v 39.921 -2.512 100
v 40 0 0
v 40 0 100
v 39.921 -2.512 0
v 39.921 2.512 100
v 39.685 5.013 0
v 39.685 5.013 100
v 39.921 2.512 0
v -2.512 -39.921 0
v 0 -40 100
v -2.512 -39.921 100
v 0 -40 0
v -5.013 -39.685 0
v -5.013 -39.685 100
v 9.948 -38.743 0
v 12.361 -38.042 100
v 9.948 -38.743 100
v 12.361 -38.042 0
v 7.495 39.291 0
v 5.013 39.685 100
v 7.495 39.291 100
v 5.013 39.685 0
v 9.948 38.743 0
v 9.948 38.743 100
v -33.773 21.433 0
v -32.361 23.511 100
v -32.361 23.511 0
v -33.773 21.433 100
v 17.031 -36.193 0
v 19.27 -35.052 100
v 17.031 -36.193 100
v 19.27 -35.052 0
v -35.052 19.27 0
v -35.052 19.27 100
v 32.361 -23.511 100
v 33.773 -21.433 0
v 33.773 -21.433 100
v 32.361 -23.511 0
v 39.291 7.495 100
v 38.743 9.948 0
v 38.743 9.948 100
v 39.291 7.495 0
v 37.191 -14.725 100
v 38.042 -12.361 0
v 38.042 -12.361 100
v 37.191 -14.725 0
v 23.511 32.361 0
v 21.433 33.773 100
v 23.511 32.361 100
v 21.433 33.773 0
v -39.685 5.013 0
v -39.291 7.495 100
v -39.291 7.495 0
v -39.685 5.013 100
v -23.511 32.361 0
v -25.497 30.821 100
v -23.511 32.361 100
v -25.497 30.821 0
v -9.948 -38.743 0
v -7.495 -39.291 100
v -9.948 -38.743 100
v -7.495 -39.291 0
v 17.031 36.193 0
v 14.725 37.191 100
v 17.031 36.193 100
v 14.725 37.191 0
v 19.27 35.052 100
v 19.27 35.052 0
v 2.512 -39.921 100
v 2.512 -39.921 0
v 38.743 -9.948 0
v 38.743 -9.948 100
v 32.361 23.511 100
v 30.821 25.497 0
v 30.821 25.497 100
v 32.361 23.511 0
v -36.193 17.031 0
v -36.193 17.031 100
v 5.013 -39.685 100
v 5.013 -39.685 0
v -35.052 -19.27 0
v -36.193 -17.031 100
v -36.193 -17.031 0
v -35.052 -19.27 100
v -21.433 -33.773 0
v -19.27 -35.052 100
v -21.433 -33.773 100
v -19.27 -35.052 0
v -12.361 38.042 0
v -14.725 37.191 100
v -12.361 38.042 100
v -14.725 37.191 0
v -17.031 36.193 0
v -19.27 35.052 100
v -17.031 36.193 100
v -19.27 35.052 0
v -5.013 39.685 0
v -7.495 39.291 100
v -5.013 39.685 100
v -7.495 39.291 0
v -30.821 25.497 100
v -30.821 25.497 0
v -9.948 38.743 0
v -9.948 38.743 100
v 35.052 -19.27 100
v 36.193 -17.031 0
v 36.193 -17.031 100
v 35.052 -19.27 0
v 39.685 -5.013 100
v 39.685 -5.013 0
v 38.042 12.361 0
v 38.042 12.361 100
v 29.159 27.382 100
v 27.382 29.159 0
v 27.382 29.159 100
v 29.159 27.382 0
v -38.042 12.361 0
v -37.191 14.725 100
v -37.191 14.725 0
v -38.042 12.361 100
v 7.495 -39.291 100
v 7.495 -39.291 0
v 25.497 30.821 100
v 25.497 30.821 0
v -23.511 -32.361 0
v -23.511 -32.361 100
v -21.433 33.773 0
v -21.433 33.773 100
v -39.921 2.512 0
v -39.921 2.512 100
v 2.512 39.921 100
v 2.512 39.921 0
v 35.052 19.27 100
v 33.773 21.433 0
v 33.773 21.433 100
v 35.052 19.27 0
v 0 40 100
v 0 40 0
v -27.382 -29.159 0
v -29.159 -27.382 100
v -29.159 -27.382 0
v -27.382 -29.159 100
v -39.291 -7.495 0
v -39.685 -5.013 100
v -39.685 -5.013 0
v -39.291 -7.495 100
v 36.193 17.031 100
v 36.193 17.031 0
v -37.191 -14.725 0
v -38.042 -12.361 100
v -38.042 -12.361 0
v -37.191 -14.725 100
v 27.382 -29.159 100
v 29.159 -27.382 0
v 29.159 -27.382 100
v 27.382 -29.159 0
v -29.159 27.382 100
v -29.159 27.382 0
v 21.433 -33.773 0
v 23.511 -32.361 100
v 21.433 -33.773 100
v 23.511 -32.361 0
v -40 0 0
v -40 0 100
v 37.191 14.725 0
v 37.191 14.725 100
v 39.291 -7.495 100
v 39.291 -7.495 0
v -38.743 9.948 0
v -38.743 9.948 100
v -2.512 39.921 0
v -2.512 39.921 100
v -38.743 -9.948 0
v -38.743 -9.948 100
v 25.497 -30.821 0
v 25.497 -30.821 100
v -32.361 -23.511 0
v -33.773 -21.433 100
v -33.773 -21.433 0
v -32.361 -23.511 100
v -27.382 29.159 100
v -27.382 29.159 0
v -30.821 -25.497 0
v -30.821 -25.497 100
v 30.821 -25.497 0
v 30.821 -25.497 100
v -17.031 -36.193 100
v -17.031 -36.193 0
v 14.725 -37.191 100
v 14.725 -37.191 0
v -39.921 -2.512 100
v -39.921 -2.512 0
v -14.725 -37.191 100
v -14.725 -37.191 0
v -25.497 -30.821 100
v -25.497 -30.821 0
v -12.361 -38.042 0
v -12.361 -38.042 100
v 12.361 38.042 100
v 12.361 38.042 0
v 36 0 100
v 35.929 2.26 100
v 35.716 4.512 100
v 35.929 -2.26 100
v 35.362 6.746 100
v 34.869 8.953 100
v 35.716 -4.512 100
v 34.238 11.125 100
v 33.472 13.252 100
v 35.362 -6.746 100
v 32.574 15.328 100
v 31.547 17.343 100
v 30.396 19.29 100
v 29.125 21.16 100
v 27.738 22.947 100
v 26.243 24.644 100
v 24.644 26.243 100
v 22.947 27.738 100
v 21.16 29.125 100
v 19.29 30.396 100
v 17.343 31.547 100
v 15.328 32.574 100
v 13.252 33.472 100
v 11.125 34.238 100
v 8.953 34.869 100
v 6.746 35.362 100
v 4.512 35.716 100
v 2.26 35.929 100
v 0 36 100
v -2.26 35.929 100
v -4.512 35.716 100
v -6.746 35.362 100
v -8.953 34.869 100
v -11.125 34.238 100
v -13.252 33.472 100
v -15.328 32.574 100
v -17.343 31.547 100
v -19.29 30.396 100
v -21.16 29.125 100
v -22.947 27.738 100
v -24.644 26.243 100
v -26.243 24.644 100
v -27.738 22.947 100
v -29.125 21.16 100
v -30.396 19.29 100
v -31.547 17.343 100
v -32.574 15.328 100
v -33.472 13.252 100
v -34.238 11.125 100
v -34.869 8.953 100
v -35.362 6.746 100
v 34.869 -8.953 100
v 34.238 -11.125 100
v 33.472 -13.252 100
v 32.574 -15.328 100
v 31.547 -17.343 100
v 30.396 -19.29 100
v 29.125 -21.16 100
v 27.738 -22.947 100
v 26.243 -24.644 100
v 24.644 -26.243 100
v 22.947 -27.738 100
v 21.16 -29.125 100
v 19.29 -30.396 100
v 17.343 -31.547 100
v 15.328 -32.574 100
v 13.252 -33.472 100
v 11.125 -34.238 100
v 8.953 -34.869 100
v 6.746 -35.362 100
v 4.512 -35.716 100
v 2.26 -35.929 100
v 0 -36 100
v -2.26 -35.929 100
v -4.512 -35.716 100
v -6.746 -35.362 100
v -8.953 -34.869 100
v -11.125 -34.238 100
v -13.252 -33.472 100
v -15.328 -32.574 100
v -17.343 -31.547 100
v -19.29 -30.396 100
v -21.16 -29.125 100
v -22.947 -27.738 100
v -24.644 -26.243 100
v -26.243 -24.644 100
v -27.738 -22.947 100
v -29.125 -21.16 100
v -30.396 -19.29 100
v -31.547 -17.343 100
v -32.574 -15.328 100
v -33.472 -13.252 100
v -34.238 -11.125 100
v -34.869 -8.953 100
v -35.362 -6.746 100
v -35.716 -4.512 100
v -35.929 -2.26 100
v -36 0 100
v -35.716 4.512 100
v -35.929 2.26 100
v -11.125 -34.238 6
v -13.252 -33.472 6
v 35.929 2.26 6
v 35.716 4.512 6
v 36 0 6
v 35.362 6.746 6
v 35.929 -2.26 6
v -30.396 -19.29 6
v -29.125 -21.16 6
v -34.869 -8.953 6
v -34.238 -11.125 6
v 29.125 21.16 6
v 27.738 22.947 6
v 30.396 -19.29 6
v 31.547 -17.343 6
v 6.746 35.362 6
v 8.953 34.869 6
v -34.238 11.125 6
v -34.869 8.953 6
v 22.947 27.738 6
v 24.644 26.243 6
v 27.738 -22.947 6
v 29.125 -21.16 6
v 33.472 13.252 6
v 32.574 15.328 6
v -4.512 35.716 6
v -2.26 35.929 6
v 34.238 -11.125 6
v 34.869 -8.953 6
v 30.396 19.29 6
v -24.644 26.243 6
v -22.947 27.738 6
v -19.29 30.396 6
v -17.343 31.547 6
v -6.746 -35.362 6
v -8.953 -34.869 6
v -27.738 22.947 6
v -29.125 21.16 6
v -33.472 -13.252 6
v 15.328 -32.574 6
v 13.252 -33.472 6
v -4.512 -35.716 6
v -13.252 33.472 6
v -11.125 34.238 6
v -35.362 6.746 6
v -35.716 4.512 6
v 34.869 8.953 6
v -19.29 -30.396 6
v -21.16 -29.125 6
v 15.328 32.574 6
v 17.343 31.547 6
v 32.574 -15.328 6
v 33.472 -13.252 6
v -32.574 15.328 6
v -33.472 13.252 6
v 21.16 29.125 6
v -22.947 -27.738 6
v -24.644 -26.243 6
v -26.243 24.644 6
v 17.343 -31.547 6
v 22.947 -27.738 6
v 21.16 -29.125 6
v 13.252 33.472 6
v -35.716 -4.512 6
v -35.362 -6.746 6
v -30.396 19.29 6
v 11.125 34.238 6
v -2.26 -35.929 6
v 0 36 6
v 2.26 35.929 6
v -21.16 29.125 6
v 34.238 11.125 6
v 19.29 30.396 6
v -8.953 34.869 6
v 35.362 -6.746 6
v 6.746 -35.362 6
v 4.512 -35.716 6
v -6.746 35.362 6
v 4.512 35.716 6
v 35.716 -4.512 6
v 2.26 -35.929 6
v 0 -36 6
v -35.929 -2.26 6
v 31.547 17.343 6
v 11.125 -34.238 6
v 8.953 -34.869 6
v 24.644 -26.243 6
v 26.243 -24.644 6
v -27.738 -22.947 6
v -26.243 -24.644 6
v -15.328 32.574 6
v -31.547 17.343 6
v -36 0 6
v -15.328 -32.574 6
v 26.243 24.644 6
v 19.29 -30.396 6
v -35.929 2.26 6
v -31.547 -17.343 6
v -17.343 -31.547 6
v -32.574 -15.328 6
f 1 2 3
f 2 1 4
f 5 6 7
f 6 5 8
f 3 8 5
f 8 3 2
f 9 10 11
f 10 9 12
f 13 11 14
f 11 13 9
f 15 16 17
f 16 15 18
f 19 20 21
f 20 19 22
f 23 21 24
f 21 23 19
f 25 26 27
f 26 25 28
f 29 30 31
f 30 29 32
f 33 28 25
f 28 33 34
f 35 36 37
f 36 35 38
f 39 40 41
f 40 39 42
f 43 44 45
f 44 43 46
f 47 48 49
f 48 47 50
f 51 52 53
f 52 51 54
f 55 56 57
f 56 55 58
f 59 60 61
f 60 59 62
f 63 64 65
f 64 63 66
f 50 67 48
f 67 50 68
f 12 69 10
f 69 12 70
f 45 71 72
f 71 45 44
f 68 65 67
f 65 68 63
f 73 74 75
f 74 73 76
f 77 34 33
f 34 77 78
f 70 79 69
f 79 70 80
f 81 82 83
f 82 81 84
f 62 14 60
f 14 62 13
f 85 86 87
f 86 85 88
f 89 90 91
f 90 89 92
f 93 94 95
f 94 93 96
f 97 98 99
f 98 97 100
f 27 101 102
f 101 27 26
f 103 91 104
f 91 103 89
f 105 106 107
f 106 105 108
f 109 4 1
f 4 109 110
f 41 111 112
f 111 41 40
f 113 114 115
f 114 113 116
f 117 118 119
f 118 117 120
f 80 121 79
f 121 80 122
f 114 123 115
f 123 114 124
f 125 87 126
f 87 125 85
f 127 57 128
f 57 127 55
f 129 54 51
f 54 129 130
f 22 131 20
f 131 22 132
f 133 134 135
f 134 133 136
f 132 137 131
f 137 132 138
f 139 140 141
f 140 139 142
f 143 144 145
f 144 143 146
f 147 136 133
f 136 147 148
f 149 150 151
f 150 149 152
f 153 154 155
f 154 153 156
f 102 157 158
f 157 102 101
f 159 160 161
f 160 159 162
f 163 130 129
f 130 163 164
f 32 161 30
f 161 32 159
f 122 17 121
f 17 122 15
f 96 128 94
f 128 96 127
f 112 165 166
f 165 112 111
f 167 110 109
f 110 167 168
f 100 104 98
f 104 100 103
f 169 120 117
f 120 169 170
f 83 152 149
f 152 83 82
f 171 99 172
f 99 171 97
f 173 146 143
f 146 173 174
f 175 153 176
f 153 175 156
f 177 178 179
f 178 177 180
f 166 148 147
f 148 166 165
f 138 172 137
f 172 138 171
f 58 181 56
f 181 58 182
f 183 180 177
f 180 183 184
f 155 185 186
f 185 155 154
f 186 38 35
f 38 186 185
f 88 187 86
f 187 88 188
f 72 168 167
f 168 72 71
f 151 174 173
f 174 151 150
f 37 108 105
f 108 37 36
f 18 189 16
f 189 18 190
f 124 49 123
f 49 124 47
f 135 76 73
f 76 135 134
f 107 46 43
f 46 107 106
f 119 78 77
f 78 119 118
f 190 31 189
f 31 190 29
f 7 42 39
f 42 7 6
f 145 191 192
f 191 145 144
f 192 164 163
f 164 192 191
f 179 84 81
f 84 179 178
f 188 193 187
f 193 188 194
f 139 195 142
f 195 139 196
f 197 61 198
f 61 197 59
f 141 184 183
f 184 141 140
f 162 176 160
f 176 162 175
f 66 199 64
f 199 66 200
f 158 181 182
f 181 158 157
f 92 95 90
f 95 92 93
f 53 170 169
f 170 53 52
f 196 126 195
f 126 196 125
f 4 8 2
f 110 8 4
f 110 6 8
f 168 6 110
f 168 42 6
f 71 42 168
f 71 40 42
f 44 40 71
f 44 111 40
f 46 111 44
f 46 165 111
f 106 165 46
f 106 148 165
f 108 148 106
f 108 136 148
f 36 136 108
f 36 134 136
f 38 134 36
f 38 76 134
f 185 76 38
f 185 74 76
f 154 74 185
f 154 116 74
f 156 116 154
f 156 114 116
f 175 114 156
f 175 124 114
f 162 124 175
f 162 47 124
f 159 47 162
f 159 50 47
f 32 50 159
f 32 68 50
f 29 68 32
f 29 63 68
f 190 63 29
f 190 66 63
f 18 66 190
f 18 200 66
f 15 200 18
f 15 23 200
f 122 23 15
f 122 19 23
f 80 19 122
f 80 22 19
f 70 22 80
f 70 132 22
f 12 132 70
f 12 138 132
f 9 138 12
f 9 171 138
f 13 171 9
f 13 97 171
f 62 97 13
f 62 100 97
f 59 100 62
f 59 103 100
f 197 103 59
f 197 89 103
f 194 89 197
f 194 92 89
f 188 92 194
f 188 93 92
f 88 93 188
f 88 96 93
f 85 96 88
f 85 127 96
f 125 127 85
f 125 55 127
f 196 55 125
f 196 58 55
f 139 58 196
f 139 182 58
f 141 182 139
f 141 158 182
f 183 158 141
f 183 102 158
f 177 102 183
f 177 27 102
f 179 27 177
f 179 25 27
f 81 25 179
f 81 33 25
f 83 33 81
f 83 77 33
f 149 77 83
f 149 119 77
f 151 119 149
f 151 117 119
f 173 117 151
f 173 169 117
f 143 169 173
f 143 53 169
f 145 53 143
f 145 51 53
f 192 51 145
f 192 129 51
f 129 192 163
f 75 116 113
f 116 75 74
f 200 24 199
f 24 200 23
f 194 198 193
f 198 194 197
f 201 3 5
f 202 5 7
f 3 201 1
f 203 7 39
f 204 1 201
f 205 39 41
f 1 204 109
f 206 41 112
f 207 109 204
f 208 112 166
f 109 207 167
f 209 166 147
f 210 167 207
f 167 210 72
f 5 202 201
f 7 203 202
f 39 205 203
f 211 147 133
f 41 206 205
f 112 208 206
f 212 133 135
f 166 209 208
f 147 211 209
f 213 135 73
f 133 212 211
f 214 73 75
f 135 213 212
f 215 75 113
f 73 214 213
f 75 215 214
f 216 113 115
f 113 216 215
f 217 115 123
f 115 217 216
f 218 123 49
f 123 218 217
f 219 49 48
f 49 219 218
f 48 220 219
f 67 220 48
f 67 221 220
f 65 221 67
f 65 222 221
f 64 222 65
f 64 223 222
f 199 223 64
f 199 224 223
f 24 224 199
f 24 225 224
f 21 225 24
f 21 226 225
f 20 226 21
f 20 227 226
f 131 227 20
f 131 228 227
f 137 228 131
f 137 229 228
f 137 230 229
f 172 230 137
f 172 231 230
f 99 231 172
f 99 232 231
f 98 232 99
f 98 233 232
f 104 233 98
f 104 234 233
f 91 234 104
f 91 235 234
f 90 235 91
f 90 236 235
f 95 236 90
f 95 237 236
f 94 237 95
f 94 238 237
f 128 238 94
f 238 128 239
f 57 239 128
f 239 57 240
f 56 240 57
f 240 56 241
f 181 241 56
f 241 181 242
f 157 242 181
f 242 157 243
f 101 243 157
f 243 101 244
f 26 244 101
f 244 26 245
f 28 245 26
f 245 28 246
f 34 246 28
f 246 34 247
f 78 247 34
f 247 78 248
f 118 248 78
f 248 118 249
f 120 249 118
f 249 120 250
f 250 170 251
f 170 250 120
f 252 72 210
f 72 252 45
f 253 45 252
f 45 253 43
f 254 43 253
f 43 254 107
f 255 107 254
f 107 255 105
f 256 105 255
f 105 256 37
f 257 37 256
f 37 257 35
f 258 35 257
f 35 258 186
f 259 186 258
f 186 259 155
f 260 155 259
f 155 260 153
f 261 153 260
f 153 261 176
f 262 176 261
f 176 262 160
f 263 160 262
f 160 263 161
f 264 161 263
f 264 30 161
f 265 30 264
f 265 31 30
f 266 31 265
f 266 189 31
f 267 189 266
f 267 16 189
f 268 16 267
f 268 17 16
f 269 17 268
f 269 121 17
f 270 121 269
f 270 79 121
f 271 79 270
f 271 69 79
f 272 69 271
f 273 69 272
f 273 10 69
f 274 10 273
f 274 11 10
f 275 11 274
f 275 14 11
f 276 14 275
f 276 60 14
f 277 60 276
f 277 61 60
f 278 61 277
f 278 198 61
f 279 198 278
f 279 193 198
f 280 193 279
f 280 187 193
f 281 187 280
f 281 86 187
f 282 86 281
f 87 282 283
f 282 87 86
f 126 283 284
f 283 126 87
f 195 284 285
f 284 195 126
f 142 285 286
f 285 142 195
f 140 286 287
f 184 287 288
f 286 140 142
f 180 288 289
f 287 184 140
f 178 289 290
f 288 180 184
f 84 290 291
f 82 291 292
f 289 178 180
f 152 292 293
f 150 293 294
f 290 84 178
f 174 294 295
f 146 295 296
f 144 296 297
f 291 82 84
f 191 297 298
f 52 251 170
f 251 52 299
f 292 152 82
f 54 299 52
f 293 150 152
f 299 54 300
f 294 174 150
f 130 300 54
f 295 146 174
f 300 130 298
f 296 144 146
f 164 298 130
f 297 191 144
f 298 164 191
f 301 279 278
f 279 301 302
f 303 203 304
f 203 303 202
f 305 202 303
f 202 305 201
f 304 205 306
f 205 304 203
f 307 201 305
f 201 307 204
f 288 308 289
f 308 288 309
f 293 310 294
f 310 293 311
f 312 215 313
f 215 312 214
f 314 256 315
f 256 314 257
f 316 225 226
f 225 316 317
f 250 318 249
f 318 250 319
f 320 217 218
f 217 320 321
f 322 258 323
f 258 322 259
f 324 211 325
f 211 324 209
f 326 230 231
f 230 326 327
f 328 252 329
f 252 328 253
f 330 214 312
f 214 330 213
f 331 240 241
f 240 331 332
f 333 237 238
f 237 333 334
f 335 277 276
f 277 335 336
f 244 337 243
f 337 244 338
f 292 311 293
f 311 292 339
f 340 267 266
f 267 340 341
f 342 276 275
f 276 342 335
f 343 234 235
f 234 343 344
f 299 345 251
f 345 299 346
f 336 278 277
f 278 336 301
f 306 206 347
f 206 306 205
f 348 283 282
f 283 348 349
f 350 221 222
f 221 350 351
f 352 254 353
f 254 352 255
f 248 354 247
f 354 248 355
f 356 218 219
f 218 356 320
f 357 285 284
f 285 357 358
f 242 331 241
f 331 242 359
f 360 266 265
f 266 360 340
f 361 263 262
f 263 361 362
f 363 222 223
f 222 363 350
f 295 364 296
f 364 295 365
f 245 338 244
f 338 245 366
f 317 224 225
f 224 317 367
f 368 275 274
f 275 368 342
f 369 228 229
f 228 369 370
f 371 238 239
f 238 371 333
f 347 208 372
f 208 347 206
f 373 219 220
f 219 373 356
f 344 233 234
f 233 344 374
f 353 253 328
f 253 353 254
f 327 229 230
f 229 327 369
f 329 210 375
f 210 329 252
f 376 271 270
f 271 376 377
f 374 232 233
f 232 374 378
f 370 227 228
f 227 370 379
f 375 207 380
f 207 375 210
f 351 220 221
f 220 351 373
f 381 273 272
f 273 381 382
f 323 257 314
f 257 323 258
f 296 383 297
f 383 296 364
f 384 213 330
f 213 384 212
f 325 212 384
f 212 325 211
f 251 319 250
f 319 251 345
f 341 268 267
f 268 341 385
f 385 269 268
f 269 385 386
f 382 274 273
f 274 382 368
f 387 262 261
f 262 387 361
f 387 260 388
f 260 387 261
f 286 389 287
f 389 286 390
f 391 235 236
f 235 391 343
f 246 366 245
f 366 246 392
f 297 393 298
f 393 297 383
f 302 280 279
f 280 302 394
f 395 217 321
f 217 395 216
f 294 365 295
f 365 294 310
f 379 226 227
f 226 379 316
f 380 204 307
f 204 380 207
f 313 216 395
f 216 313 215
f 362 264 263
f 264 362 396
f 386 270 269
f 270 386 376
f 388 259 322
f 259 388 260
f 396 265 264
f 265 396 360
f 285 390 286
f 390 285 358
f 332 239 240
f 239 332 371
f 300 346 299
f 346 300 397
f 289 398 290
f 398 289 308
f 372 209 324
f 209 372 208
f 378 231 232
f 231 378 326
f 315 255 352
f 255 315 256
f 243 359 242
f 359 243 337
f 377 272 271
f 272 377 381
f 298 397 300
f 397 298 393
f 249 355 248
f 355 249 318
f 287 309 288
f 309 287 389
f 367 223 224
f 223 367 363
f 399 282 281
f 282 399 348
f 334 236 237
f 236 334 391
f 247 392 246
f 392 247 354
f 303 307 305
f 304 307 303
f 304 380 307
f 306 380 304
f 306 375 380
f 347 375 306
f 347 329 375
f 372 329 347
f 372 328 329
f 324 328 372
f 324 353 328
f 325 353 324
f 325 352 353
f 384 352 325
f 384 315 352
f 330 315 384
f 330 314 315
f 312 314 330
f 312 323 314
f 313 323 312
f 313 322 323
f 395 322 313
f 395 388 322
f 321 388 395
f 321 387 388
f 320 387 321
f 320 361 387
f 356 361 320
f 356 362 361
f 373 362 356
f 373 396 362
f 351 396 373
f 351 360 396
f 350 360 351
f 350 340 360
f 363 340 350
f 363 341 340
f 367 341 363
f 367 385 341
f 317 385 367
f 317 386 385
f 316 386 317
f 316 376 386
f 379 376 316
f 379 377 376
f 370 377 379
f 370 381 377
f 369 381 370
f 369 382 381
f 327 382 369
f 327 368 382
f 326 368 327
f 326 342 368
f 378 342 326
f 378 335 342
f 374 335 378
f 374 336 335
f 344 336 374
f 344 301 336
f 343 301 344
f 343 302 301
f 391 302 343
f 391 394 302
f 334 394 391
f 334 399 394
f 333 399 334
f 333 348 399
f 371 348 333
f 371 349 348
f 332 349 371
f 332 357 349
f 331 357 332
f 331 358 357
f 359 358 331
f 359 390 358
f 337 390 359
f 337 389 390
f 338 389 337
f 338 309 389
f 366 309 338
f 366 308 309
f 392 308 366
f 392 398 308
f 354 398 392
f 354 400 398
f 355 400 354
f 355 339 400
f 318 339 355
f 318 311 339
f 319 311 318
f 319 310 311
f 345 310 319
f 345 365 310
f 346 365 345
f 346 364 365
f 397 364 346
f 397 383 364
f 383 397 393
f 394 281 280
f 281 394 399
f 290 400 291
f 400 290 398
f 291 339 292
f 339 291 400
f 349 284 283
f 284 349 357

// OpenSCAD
// マグカップのパラメータ
outer_diameter = 80;
outer_radius = outer_diameter / 2; // 40mm
height = 100;
wall_thickness = 4;
bottom_thickness = 6;

// 取手のパラメータ
handle_outer_radius = 12;
handle_thickness = 8; // 取手の太さ（パイプの断面の半径）
handle_radius = handle_outer_radius - handle_thickness; // 取手の中心軌道の半径
handle_z = height / 2; // カップの中心高さ

// 解像度の設定
$fn = 100;

module mug() {
    // 1. メインボディと取手の結合
    union() {
        // カップ本体
        difference() {
            // 外側
            cylinder(h = height, r = outer_radius);
            
            // 内側（くり抜き）
            translate([0, 0, bottom_thickness])
                cylinder(h = height - bottom_thickness + 1, r = outer_radius - wall_thickness);
        }
        
        // 取手（リング状）
        // カップの側面から外側に飛び出すように配置
        translate([outer_radius + handle_radius - wall_thickness, 0, handle_z])
            rotate([0, 90, 0])
                rotate_extrude()
                    translate([handle_radius, 0, 0])
                        circle(r = handle_thickness);
    }
}

mug();
